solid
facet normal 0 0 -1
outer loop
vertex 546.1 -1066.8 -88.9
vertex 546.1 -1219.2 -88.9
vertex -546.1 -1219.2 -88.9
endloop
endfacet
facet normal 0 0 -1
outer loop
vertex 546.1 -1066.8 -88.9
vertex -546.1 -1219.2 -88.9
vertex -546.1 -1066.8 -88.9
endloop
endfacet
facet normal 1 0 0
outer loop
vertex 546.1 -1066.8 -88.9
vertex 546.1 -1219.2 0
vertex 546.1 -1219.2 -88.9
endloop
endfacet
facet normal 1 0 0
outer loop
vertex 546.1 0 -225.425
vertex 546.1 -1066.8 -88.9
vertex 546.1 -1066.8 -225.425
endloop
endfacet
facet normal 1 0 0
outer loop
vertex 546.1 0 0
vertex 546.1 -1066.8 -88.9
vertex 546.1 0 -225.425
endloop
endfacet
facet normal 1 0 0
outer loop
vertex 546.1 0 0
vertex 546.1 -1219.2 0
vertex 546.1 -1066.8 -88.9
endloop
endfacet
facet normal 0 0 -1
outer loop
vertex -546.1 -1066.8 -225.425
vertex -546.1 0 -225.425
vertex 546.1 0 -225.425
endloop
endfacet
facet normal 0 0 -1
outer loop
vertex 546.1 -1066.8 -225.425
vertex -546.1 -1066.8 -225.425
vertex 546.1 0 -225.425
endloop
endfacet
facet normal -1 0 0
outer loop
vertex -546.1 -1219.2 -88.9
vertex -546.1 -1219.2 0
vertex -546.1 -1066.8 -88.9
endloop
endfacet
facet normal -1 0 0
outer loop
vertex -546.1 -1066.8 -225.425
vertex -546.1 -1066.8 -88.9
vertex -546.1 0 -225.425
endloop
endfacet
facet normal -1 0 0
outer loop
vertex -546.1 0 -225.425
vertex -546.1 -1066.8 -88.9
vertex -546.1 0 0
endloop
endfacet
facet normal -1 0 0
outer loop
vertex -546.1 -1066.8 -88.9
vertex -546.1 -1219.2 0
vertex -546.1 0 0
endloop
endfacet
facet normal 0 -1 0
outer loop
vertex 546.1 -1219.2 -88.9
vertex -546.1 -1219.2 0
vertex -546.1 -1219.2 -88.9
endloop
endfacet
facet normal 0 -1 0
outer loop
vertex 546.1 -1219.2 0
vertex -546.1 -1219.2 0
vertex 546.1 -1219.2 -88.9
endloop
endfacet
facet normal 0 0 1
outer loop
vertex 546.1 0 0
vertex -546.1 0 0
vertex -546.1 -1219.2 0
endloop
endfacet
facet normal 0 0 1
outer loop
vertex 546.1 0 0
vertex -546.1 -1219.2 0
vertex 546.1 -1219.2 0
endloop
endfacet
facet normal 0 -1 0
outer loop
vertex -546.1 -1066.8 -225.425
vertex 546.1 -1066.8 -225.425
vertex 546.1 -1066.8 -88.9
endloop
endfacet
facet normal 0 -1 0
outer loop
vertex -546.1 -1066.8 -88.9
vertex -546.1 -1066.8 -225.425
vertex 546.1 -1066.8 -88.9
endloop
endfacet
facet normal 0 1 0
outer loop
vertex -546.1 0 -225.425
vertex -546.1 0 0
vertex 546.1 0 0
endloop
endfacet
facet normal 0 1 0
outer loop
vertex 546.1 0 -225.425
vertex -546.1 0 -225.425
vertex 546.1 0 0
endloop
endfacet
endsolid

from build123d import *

# Parameters (mm, degrees)
F0_W     = 1092.2
F0_H     = 1219.2
F1_DEPTH = 225.425
F2_W     = 152.4
F2_H     = 136.525
F3_DEPTH = 1092.2


with BuildPart() as f1:
    # F0 (on Top) → F1 (new body)
    with BuildSketch(Plane.XY):
        with Locations((0, -609.6)):
            Rectangle(F0_W, F0_H)
    extrude(amount=-F1_DEPTH)

    # F2 (on face) → F3 (cut, through all)
    with BuildSketch(Plane.YZ.offset(546.1)):
        with Locations((-1143, -157.1625)):
            Rectangle(F2_W, F2_H)
    extrude(amount=-F3_DEPTH, mode=Mode.SUBTRACT)


solid = f1.part
